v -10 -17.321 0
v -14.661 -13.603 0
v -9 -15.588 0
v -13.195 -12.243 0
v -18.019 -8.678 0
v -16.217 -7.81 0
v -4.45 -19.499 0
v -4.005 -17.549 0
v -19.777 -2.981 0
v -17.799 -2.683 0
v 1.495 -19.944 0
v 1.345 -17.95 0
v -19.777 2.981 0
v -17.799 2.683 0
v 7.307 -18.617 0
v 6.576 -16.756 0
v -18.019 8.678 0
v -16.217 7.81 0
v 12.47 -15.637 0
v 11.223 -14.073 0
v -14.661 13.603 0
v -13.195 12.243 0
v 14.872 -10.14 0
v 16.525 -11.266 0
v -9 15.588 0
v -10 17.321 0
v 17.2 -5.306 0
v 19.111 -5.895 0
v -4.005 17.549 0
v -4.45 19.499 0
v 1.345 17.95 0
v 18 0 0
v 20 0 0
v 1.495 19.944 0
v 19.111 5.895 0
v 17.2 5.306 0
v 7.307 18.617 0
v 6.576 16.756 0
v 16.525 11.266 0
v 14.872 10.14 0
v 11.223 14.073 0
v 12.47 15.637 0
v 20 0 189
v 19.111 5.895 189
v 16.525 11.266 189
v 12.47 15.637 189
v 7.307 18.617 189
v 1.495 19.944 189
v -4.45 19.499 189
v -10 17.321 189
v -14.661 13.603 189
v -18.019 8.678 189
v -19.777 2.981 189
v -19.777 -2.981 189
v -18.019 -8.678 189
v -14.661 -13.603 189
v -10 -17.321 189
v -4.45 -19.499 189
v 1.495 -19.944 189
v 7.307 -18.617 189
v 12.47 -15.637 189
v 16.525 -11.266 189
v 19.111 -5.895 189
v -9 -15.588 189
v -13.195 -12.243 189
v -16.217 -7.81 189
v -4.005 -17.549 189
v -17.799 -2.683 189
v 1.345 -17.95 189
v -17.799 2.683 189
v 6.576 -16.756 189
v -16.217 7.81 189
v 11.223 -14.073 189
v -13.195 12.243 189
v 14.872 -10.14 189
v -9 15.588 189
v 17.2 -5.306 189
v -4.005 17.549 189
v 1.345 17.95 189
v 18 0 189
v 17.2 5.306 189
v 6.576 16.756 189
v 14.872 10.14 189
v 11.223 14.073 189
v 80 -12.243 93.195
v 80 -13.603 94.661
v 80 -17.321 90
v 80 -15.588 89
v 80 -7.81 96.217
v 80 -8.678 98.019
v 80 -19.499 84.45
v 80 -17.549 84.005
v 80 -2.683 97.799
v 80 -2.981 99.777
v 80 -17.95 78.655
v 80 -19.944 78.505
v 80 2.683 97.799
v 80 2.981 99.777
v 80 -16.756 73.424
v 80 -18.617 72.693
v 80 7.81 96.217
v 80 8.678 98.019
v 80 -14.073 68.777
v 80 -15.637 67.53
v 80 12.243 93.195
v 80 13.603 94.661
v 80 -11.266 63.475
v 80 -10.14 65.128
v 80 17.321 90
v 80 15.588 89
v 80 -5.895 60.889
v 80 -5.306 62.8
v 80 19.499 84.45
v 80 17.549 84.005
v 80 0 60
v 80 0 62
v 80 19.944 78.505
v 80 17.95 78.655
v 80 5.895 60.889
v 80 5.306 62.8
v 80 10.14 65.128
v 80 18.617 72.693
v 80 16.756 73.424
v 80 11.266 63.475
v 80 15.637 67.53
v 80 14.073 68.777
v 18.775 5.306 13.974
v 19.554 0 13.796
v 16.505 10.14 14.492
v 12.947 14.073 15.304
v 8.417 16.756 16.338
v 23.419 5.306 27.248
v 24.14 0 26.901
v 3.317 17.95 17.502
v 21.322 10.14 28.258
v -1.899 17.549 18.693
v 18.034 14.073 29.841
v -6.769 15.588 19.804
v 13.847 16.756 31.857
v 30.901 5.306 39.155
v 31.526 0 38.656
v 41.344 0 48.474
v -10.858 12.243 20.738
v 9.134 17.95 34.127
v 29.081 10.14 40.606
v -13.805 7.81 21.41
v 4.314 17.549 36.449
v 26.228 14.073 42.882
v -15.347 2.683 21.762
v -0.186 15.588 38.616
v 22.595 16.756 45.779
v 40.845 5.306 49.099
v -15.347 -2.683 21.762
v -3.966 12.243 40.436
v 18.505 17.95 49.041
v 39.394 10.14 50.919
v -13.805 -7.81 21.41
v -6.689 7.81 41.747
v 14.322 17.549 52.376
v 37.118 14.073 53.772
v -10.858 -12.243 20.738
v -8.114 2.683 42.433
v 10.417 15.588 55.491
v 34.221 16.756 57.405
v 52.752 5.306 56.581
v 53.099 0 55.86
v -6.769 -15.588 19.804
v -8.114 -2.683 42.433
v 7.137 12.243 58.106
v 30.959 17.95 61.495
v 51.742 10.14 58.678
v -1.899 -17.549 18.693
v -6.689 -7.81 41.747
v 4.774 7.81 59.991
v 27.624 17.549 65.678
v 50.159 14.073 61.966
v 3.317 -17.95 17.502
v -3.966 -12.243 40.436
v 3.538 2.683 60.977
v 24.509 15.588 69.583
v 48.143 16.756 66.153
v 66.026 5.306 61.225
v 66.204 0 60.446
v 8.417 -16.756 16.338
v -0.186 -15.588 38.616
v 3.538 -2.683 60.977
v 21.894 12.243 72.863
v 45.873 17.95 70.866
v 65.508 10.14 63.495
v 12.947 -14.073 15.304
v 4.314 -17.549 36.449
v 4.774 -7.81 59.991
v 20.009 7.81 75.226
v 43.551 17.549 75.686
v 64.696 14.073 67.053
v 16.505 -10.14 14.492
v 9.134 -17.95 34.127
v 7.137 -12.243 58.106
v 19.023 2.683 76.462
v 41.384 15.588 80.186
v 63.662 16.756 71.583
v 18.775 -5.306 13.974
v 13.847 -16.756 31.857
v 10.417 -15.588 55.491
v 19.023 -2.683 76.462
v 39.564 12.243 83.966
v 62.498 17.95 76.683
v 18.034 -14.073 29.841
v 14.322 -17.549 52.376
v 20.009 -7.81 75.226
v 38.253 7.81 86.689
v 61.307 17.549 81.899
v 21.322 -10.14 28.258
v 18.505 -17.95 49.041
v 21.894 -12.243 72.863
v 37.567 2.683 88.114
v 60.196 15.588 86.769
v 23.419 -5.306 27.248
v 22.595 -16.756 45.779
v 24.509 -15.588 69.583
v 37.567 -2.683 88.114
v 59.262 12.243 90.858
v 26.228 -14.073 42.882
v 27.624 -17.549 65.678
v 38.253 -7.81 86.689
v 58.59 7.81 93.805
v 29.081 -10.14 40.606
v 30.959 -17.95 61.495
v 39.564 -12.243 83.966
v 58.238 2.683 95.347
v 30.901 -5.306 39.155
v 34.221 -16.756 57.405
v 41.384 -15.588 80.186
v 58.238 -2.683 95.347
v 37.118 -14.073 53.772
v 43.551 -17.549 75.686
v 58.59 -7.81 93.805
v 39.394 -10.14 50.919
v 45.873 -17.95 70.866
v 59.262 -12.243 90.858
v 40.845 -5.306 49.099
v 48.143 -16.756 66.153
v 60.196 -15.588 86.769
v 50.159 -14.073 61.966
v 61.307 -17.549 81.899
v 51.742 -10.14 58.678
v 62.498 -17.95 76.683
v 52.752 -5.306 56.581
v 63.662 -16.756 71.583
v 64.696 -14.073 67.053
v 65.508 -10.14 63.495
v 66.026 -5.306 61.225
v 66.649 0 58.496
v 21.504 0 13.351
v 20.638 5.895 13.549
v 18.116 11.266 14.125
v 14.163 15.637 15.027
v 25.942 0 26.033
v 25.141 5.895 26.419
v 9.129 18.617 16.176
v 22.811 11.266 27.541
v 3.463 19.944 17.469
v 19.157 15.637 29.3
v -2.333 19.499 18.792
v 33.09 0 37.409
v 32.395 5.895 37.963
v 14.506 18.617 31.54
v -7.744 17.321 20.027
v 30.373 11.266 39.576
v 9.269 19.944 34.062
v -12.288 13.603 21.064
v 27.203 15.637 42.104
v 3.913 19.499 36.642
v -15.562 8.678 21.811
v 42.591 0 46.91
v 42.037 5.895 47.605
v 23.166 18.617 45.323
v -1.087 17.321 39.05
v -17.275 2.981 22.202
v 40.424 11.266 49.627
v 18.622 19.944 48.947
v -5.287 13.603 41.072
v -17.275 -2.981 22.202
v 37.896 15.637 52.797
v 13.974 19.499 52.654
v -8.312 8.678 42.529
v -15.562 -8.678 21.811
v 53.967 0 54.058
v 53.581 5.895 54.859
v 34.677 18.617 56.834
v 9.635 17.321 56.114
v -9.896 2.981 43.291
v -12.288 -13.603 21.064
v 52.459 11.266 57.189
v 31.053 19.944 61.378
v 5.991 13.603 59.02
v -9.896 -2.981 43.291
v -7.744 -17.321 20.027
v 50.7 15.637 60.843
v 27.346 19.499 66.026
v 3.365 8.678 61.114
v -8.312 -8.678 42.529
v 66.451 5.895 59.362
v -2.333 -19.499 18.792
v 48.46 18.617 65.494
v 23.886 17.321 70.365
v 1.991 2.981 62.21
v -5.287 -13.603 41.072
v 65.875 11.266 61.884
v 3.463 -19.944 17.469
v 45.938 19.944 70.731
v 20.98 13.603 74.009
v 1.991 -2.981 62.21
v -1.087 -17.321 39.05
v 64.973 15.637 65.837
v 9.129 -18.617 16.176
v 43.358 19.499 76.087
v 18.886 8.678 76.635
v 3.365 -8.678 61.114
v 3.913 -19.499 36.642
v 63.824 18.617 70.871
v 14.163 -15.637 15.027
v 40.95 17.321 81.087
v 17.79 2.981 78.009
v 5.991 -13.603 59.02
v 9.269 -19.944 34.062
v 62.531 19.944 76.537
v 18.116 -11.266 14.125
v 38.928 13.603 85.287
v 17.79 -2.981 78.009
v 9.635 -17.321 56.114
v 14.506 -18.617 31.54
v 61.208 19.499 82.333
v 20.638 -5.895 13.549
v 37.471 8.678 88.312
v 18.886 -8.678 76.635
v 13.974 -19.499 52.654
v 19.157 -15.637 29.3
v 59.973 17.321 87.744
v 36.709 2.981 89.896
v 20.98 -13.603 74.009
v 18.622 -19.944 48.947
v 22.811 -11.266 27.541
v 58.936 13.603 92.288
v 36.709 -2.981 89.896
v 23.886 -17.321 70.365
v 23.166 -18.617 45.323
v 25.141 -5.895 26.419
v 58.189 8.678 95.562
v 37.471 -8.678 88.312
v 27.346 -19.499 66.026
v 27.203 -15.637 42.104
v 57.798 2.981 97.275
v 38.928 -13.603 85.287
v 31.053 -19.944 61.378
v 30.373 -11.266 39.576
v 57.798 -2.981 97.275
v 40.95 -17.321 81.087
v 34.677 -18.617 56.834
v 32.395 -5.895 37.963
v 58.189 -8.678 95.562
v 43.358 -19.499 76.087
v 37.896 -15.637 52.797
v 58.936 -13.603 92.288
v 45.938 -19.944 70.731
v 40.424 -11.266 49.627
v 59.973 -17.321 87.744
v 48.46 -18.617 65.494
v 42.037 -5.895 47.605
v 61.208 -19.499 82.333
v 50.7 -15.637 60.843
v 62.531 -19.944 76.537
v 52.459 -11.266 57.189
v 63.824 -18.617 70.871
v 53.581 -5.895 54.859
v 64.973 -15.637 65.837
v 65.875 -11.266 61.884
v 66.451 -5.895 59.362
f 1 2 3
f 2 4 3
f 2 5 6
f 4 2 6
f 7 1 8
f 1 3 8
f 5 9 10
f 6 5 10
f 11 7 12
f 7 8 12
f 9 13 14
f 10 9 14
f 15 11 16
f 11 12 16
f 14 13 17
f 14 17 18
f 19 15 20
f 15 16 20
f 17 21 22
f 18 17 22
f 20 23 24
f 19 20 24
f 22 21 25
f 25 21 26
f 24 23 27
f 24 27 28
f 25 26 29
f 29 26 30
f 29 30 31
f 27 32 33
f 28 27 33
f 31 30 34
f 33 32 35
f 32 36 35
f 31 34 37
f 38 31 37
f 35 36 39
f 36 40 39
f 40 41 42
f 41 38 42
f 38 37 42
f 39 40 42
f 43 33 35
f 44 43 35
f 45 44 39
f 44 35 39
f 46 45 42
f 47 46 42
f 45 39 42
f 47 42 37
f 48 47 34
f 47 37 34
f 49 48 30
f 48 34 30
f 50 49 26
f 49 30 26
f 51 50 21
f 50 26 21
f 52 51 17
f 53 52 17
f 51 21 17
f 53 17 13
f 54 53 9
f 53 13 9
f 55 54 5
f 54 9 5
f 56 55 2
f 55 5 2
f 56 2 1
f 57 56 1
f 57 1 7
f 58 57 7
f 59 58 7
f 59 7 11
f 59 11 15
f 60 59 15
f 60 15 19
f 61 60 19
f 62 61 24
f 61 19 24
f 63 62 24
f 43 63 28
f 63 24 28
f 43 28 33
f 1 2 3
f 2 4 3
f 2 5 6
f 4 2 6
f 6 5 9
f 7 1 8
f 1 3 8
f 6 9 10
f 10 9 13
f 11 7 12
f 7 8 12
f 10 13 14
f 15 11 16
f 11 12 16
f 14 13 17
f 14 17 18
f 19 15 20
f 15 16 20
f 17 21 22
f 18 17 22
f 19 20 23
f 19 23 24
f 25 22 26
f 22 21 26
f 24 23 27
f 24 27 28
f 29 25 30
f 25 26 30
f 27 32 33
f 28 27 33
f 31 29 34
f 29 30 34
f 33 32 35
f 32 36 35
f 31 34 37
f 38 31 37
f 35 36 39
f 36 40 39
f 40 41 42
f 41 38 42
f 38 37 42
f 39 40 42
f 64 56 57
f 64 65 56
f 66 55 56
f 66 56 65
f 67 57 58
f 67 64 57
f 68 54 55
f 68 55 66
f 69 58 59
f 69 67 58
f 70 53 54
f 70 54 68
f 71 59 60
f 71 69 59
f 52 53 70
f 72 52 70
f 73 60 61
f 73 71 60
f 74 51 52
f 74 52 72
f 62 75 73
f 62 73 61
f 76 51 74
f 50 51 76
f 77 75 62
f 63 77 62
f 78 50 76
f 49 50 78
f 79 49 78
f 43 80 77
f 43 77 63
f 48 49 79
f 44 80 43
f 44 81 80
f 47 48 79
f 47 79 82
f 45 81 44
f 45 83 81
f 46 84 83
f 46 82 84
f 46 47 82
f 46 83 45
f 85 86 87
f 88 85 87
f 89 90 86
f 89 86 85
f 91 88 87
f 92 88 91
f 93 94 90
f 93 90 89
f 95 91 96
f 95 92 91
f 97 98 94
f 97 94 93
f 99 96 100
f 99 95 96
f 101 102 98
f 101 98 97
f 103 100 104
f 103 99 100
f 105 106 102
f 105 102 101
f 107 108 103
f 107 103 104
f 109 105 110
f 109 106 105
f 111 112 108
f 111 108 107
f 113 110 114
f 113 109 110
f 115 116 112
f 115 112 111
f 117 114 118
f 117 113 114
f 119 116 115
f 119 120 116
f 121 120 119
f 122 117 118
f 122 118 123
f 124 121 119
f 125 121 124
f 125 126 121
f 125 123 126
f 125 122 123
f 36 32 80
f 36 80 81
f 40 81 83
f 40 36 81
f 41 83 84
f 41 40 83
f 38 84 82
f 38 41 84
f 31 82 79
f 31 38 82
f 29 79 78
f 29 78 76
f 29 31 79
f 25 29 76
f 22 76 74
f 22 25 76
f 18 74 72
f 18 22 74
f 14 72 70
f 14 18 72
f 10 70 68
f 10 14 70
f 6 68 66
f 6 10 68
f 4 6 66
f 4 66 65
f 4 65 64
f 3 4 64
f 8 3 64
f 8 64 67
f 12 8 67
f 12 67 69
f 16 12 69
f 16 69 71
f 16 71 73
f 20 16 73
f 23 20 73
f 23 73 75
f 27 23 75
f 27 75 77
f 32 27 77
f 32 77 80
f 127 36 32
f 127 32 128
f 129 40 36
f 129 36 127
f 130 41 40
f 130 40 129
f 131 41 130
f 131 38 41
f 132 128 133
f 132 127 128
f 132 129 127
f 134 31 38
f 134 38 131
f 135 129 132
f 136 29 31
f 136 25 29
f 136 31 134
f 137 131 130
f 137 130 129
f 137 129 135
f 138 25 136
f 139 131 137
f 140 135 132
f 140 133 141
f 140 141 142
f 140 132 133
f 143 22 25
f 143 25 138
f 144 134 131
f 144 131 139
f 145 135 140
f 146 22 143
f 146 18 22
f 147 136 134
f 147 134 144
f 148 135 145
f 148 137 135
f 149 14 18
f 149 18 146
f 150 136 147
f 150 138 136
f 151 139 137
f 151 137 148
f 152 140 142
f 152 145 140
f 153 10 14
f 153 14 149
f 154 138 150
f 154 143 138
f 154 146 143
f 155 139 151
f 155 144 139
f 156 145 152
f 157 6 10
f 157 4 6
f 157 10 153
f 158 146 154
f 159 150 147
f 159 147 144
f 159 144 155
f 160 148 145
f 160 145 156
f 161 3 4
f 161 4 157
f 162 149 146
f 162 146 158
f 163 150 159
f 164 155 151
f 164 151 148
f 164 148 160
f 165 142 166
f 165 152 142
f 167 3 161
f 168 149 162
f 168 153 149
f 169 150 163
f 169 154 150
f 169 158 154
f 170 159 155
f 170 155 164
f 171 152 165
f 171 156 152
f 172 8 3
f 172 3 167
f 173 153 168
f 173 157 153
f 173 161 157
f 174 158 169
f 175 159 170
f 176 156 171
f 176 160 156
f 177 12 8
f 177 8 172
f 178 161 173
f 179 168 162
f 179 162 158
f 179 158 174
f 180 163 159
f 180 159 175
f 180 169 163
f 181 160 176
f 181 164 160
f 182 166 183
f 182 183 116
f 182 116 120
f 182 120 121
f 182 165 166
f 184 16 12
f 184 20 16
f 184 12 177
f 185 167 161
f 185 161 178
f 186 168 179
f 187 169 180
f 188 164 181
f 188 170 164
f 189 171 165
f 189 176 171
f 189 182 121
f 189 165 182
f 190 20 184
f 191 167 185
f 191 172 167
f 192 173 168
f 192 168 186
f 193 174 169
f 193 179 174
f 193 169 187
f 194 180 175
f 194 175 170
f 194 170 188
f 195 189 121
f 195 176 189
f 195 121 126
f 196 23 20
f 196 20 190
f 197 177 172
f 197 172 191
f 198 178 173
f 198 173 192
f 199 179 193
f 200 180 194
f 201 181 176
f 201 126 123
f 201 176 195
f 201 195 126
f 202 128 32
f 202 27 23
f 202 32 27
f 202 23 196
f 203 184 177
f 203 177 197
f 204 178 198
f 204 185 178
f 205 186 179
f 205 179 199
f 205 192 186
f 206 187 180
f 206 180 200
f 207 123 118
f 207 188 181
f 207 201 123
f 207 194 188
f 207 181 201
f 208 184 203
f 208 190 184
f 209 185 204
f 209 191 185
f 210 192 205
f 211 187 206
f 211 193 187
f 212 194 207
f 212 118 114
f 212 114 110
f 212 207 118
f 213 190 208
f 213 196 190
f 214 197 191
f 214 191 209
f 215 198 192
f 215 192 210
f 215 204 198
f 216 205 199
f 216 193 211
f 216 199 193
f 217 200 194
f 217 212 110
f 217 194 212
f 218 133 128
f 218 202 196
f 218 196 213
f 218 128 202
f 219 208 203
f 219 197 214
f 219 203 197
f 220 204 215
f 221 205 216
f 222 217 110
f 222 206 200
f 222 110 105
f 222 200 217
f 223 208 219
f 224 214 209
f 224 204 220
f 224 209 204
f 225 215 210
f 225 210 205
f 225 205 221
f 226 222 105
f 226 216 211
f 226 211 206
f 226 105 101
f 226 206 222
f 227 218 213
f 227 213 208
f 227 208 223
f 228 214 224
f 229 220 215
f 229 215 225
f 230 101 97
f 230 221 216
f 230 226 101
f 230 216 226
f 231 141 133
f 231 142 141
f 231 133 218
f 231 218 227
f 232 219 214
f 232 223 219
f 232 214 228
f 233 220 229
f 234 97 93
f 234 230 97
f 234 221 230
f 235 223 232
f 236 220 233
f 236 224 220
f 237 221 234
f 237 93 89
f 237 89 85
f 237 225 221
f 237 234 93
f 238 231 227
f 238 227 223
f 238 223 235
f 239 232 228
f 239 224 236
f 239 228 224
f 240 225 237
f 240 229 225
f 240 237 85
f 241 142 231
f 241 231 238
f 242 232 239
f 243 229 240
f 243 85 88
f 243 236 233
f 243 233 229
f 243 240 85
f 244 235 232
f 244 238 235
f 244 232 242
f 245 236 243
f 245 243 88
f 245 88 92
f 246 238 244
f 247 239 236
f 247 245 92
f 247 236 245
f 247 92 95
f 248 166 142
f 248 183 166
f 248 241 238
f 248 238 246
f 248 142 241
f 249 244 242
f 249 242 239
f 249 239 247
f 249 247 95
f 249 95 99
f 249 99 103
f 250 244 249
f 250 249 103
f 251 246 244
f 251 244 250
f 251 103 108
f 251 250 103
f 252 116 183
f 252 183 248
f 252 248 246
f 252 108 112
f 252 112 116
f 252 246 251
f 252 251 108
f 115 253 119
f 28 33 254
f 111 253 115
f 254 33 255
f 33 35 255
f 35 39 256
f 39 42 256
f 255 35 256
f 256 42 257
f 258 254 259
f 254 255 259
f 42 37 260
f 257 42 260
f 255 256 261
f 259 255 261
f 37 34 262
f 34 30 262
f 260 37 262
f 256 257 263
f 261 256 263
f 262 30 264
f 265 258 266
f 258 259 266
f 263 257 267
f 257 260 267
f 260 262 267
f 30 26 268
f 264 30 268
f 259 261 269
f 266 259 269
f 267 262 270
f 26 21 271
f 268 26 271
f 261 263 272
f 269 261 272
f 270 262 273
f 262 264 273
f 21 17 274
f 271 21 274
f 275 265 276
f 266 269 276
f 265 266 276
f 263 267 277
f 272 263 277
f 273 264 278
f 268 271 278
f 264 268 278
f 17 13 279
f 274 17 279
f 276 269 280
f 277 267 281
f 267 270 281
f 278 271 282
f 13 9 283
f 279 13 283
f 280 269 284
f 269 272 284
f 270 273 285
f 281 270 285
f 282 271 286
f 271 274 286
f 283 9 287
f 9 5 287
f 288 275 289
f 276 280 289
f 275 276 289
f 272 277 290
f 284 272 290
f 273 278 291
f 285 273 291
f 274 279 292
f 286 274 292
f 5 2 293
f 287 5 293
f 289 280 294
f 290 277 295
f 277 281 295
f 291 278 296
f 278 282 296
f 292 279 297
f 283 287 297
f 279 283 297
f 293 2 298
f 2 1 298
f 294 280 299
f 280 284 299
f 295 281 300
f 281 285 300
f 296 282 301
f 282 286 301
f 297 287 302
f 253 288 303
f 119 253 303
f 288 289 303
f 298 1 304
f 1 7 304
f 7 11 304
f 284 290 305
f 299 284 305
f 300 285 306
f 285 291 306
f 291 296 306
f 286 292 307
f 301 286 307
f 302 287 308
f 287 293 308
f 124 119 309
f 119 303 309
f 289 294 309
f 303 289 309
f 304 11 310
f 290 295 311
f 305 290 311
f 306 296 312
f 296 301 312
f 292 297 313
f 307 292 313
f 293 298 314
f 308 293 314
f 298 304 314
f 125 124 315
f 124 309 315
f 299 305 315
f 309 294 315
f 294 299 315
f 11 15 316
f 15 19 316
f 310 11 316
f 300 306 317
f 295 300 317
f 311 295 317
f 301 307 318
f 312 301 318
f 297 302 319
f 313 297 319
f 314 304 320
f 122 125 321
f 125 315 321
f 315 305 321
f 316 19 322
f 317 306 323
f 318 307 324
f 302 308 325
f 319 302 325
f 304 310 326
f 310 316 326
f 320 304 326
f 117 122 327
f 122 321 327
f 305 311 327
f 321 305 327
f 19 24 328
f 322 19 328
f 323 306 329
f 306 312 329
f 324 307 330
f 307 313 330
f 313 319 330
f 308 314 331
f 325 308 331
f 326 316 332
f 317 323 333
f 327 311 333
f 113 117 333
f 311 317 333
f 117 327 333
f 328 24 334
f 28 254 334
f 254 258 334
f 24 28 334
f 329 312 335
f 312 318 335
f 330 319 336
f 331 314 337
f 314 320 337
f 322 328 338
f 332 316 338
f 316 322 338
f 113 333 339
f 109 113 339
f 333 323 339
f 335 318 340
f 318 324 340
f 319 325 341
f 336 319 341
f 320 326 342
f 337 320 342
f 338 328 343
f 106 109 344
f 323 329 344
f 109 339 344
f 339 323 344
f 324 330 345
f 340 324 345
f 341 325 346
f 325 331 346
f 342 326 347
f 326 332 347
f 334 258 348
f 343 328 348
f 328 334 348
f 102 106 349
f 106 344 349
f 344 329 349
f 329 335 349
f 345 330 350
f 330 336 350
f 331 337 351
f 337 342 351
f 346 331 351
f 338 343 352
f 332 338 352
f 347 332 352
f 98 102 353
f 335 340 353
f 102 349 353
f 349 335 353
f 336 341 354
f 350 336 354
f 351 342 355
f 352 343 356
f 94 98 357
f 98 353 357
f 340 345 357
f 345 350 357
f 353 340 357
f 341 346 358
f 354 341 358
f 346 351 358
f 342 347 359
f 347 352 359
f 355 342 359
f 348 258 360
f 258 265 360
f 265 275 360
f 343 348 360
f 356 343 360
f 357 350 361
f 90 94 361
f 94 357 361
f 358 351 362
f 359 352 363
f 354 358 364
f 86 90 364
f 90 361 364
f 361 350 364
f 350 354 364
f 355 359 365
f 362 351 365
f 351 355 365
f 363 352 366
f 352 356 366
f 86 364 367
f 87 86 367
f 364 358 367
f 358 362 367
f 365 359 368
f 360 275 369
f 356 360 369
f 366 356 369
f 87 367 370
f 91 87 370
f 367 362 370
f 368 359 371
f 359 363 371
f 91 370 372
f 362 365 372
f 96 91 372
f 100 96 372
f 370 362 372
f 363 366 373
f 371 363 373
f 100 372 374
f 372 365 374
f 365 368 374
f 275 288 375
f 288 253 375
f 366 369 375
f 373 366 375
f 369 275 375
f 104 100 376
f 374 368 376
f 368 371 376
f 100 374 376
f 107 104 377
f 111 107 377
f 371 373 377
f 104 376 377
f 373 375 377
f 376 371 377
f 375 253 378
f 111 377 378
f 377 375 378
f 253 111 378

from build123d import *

# Parameters (mm, degrees)
F0_R     = 20
F1_DEPTH = 189
F3_ANGLE = 90
F4_T     = -2
F4_2_T   = -2


with BuildPart() as f1:
    # F0 (on Top) → F1 (new body)
    with BuildSketch(Plane.XY):
        Circle(F0_R)
    extrude(amount=F1_DEPTH)

    # F4#2
    f4_2_openings = [f1.faces().sort_by_distance(p)[0] for p in [
        (0, 0, 0),
        (0, 0, 189),
    ]]
    offset(amount=F4_2_T, openings=f4_2_openings)


with BuildPart() as f3:
    # F0 (on Top) → F3 (revolve)
    with BuildSketch(Plane.XY):
        Circle(F0_R)
    revolve(axis=Axis((80, 46.6175764806, 0), (0, 1, 0)), revolution_arc=F3_ANGLE)

    # F4
    f4_openings = [f3.faces().sort_by_distance(p)[0] for p in [
        (80, 0, 80),
        (0, 0, 0),
    ]]
    offset(amount=F4_T, openings=f4_openings)


solid = Compound([f1.part, f3.part])
